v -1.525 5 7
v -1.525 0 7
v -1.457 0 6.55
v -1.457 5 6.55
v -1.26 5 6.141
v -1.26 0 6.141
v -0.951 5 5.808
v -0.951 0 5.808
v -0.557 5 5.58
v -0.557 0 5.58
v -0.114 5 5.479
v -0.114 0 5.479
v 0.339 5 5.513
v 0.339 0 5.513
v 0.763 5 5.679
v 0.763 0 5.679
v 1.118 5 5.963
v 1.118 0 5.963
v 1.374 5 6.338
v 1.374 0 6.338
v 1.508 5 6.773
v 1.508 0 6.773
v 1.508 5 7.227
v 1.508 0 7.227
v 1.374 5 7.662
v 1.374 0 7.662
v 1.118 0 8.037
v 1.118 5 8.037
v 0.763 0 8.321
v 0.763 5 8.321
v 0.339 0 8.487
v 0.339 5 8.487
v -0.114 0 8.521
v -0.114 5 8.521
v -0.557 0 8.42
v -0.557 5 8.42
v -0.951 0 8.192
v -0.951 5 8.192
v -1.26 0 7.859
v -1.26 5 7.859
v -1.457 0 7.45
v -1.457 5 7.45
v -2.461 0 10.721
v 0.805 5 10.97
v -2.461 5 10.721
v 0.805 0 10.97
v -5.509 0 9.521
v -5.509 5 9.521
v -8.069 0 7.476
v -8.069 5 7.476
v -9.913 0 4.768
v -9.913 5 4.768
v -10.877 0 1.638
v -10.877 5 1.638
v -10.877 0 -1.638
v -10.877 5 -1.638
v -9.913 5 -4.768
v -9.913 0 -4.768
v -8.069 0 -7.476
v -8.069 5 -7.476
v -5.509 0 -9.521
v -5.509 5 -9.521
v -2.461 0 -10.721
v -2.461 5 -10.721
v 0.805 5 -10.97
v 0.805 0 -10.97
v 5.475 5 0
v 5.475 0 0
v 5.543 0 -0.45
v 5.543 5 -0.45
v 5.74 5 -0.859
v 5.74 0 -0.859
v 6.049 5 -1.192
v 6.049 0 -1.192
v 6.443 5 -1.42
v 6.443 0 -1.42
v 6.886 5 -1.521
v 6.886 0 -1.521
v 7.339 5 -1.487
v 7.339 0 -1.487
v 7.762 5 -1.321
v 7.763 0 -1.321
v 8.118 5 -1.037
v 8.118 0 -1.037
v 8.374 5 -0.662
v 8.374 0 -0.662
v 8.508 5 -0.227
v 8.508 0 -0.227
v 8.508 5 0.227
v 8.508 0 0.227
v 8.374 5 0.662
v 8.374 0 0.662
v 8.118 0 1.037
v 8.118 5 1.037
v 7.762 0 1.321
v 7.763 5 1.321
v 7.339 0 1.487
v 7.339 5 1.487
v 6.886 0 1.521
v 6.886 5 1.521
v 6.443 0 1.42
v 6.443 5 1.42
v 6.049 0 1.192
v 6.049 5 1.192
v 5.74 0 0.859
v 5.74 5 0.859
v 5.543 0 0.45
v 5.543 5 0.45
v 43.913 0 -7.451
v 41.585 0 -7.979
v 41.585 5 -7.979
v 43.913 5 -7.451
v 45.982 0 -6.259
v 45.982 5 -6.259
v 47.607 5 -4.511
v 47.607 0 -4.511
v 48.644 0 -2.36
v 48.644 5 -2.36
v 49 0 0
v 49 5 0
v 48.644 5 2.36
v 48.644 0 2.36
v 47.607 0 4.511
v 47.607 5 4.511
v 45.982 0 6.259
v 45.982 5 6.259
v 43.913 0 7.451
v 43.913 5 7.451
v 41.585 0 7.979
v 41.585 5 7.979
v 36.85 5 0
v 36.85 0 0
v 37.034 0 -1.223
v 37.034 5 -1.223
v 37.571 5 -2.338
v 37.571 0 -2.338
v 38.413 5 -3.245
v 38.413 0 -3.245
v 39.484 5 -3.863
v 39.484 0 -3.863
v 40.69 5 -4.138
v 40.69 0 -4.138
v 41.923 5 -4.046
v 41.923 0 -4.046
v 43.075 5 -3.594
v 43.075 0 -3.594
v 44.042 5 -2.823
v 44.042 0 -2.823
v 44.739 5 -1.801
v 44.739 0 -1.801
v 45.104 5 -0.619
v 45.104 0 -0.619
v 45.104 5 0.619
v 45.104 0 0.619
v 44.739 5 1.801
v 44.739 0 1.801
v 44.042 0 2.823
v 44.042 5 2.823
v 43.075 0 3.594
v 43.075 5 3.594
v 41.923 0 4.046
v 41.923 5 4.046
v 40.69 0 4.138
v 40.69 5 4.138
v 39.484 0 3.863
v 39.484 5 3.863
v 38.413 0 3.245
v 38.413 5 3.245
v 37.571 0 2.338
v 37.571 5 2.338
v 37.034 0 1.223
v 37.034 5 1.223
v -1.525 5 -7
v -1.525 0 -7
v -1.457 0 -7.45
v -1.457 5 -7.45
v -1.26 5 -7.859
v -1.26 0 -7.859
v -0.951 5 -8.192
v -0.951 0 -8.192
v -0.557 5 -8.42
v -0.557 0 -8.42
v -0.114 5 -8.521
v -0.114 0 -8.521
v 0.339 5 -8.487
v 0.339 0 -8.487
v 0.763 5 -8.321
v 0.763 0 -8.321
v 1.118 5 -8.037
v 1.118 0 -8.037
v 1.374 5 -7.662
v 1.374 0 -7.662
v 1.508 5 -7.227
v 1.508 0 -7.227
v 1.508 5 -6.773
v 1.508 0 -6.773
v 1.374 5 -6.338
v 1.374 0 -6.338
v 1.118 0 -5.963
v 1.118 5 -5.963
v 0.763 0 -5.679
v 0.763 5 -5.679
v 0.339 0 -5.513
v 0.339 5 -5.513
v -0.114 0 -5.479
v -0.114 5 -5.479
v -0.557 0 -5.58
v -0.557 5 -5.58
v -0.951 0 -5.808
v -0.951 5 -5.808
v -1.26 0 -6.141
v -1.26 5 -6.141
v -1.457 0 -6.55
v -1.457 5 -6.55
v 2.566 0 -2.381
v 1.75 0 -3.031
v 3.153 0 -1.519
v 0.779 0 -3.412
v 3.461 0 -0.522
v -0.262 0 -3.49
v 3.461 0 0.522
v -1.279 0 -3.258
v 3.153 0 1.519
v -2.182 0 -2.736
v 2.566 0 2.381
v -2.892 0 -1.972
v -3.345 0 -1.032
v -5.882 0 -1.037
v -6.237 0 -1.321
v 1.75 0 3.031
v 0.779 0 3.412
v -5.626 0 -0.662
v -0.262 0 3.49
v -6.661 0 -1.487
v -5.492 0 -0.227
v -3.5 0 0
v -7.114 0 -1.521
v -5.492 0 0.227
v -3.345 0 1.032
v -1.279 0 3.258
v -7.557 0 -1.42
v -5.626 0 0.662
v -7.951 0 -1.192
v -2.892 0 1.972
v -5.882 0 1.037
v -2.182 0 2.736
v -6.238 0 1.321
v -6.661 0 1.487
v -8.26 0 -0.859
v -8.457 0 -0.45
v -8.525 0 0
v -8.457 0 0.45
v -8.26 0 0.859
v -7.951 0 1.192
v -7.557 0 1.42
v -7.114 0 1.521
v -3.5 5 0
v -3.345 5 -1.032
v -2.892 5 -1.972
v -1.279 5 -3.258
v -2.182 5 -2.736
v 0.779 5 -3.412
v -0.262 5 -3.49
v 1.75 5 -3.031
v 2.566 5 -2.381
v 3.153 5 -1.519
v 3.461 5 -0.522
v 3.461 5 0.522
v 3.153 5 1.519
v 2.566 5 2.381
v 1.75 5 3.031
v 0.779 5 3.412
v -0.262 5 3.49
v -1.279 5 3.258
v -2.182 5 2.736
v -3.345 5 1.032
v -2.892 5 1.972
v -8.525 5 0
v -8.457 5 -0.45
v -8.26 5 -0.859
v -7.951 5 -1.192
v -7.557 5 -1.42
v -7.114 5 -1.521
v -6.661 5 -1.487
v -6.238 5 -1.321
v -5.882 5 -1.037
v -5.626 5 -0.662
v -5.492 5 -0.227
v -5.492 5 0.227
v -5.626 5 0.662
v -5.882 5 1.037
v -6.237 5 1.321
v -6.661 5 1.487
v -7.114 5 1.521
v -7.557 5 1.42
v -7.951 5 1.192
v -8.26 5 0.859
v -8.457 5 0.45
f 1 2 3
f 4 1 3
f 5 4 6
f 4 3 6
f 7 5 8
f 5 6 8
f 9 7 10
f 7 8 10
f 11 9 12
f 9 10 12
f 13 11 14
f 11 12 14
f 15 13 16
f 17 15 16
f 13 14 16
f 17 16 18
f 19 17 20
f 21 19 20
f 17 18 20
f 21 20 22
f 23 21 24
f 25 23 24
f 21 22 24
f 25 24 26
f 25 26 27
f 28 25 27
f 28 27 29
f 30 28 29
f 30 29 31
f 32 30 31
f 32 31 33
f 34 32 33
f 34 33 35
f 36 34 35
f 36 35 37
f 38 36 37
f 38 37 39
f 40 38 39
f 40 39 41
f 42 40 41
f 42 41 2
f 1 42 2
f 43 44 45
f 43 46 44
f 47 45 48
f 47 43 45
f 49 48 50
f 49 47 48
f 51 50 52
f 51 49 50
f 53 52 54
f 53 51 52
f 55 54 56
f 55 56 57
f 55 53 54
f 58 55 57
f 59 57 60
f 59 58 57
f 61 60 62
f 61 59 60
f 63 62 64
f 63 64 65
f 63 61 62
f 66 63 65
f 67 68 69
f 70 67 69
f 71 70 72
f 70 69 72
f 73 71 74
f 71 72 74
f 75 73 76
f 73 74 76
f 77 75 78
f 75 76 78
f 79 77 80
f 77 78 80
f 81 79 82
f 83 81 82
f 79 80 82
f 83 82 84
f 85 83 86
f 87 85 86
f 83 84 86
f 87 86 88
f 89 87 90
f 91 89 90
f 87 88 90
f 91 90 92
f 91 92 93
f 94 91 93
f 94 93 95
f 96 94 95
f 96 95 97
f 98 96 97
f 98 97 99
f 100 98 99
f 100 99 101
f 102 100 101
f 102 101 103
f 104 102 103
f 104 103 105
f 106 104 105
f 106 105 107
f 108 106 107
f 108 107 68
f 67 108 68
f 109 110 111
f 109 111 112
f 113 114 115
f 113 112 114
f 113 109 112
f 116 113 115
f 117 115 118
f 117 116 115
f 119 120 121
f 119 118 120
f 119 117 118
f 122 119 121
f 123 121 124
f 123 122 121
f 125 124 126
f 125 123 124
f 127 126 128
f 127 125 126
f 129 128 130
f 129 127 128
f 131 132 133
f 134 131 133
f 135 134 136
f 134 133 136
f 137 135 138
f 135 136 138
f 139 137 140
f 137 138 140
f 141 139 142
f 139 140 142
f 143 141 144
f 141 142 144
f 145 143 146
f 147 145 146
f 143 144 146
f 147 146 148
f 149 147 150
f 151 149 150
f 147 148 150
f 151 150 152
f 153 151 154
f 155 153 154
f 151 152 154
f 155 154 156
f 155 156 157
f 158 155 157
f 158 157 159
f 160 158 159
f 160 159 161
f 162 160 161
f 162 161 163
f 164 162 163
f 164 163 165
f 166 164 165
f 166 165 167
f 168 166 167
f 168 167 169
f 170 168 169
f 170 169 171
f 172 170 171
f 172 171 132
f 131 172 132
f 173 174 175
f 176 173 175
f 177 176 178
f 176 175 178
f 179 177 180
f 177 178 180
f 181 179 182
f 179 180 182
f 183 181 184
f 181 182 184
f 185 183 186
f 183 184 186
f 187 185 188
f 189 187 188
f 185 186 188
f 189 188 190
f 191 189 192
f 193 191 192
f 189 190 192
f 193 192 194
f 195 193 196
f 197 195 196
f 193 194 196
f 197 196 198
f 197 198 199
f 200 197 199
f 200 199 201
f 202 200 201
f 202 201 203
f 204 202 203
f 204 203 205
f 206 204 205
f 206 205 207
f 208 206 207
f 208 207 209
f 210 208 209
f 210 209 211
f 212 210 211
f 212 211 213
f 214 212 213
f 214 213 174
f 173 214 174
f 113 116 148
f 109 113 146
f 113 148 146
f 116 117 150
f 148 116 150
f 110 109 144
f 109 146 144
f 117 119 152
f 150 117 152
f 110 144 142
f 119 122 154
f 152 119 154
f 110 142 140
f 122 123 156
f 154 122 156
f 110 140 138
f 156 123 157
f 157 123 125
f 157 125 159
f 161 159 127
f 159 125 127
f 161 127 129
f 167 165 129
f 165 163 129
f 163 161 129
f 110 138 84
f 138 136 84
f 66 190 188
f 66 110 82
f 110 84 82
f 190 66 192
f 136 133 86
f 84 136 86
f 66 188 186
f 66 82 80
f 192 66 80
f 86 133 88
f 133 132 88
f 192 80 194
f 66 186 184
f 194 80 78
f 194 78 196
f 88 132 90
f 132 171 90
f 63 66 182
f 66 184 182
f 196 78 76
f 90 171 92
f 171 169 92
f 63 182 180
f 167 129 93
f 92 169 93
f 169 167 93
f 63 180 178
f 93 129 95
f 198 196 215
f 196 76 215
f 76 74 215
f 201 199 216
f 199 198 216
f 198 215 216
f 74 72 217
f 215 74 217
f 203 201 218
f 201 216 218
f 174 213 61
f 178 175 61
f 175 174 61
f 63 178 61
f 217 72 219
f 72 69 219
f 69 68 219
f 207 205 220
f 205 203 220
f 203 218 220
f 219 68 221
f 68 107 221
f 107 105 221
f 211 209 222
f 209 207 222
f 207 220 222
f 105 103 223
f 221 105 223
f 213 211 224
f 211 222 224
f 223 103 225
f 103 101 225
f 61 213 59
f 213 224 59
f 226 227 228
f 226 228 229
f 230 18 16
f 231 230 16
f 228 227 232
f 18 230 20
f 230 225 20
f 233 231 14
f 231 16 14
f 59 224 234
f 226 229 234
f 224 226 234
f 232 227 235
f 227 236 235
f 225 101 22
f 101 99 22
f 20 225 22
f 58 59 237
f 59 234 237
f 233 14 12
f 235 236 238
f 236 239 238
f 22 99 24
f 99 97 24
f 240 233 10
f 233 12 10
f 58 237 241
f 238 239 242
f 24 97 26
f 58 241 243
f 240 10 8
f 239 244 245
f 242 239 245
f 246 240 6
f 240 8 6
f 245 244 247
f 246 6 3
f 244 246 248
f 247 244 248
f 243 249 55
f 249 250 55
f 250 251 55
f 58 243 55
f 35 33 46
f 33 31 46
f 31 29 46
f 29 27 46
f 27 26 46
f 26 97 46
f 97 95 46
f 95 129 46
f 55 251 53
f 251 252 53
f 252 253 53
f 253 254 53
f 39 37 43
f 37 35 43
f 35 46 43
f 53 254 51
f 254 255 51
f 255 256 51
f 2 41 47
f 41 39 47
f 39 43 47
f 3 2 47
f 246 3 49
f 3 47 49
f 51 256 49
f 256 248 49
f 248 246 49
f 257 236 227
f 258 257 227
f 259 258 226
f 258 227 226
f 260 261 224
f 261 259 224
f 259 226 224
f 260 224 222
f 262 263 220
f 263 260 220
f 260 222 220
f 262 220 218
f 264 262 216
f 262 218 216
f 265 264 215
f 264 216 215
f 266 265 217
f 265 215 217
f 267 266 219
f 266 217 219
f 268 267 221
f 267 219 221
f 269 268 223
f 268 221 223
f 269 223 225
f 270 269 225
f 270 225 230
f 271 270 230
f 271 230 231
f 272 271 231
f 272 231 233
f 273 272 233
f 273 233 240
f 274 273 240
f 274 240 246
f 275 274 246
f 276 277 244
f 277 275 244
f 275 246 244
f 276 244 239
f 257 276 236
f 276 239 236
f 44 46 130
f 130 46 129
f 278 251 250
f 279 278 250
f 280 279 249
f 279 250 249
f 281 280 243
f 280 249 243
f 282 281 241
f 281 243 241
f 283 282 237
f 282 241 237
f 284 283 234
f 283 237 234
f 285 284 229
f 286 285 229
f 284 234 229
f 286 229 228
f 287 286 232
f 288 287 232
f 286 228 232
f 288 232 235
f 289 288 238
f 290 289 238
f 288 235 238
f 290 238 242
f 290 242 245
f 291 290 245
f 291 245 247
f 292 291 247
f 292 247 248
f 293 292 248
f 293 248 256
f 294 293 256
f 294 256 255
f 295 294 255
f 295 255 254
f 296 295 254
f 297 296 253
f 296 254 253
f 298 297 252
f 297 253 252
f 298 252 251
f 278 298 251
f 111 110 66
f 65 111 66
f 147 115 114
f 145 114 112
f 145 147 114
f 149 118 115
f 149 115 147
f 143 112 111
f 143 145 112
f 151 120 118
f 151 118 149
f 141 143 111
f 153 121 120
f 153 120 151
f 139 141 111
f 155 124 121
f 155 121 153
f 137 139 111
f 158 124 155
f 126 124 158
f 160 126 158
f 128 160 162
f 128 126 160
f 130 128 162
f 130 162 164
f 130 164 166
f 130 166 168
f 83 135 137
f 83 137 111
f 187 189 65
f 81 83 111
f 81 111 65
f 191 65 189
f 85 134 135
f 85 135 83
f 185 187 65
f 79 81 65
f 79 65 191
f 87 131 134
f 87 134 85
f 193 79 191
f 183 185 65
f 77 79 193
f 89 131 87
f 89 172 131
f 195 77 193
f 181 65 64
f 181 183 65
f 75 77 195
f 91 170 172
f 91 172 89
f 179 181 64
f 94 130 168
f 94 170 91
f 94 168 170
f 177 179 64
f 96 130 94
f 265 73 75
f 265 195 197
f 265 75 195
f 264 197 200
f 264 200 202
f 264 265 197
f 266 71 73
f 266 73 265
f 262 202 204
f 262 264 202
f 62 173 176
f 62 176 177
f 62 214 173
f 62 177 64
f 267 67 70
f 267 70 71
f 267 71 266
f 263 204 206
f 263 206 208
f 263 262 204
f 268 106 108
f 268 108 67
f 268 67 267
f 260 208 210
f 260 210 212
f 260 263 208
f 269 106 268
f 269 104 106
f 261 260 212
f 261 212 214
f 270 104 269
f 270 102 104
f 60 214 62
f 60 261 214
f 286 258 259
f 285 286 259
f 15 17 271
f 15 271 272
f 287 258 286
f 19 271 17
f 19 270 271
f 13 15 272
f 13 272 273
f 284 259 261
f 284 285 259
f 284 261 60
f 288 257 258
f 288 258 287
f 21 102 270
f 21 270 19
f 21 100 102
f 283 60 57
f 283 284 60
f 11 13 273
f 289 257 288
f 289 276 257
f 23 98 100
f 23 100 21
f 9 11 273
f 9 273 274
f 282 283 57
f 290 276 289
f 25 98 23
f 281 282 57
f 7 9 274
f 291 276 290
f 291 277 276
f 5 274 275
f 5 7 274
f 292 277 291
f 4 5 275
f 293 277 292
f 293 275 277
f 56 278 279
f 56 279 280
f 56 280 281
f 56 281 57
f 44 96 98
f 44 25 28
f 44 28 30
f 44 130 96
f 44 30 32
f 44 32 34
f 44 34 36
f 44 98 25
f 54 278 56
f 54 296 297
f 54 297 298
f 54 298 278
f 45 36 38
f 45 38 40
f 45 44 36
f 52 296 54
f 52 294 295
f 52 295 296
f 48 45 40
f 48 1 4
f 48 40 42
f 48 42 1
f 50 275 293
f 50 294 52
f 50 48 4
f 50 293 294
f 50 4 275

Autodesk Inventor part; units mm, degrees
ref_plane "YZ Plane" through (0, 0, 0) normal (1, 0, 0) x (0, 1, 0)
ref_plane "XZ Plane" through (0, 0, 0) normal (0, 1, 0) x (-1, 0, 0)
ref_plane "XY Plane" through (0, 0, 0) normal (0, 0, 1) x (1, 0, 0)
sketch "草图1" plane through (0, 0, 0) normal (0, 1, 0) x (-1, 0, 0)
  circle A0 centre (0, 0) radius 11
  circle A1 centre (0, 0) radius 3.5
  circle A2 centre (0, 0) radius 7
  circle A3 centre (7, 0) radius 1.525
  circle A4 centre (0, 7) radius 1.525
  circle A5 centre (-7, 0) radius 1.525
  circle A6 centre (0, -7) radius 1.525
  line L0 (0, 0) -> (2.6058, 0)
  line L1 (0, 0) -> (0, -1.55)
  line L2 (-0.8049, 10.9705) -> (-41.5854, 7.9786)
  line L3 (-41.5854, 7.9786) -> (-41.5854, -7.9786)
  line L4 (-41.5854, -7.9786) -> (-0.8049, -10.9705)
  circle A7 centre (-41, 0) radius 8
  circle A8 centre (-41, 0) radius 4.15
  point P0 (-41.5854, -7.9786)
  dimension "d7" = 16
  dimension "d0" = 22
  dimension "d1" = 7
  dimension "d2" = 14
  dimension "d3" = 3.05
  dimension "d4" = 3.05
  dimension "d5" = 3.05
  dimension "d6" = 3.05
  dimension "d8" = 41
  dimension "d9" = 8.3
extrude "拉伸1" add sketch "草图1" along normal blind 5 contours A0 | A0 L4 A7 L2 | A7 L3 A8 | L3 A8 A7 | A3 A2 A6 A5 A4
properties part number "leg4"
